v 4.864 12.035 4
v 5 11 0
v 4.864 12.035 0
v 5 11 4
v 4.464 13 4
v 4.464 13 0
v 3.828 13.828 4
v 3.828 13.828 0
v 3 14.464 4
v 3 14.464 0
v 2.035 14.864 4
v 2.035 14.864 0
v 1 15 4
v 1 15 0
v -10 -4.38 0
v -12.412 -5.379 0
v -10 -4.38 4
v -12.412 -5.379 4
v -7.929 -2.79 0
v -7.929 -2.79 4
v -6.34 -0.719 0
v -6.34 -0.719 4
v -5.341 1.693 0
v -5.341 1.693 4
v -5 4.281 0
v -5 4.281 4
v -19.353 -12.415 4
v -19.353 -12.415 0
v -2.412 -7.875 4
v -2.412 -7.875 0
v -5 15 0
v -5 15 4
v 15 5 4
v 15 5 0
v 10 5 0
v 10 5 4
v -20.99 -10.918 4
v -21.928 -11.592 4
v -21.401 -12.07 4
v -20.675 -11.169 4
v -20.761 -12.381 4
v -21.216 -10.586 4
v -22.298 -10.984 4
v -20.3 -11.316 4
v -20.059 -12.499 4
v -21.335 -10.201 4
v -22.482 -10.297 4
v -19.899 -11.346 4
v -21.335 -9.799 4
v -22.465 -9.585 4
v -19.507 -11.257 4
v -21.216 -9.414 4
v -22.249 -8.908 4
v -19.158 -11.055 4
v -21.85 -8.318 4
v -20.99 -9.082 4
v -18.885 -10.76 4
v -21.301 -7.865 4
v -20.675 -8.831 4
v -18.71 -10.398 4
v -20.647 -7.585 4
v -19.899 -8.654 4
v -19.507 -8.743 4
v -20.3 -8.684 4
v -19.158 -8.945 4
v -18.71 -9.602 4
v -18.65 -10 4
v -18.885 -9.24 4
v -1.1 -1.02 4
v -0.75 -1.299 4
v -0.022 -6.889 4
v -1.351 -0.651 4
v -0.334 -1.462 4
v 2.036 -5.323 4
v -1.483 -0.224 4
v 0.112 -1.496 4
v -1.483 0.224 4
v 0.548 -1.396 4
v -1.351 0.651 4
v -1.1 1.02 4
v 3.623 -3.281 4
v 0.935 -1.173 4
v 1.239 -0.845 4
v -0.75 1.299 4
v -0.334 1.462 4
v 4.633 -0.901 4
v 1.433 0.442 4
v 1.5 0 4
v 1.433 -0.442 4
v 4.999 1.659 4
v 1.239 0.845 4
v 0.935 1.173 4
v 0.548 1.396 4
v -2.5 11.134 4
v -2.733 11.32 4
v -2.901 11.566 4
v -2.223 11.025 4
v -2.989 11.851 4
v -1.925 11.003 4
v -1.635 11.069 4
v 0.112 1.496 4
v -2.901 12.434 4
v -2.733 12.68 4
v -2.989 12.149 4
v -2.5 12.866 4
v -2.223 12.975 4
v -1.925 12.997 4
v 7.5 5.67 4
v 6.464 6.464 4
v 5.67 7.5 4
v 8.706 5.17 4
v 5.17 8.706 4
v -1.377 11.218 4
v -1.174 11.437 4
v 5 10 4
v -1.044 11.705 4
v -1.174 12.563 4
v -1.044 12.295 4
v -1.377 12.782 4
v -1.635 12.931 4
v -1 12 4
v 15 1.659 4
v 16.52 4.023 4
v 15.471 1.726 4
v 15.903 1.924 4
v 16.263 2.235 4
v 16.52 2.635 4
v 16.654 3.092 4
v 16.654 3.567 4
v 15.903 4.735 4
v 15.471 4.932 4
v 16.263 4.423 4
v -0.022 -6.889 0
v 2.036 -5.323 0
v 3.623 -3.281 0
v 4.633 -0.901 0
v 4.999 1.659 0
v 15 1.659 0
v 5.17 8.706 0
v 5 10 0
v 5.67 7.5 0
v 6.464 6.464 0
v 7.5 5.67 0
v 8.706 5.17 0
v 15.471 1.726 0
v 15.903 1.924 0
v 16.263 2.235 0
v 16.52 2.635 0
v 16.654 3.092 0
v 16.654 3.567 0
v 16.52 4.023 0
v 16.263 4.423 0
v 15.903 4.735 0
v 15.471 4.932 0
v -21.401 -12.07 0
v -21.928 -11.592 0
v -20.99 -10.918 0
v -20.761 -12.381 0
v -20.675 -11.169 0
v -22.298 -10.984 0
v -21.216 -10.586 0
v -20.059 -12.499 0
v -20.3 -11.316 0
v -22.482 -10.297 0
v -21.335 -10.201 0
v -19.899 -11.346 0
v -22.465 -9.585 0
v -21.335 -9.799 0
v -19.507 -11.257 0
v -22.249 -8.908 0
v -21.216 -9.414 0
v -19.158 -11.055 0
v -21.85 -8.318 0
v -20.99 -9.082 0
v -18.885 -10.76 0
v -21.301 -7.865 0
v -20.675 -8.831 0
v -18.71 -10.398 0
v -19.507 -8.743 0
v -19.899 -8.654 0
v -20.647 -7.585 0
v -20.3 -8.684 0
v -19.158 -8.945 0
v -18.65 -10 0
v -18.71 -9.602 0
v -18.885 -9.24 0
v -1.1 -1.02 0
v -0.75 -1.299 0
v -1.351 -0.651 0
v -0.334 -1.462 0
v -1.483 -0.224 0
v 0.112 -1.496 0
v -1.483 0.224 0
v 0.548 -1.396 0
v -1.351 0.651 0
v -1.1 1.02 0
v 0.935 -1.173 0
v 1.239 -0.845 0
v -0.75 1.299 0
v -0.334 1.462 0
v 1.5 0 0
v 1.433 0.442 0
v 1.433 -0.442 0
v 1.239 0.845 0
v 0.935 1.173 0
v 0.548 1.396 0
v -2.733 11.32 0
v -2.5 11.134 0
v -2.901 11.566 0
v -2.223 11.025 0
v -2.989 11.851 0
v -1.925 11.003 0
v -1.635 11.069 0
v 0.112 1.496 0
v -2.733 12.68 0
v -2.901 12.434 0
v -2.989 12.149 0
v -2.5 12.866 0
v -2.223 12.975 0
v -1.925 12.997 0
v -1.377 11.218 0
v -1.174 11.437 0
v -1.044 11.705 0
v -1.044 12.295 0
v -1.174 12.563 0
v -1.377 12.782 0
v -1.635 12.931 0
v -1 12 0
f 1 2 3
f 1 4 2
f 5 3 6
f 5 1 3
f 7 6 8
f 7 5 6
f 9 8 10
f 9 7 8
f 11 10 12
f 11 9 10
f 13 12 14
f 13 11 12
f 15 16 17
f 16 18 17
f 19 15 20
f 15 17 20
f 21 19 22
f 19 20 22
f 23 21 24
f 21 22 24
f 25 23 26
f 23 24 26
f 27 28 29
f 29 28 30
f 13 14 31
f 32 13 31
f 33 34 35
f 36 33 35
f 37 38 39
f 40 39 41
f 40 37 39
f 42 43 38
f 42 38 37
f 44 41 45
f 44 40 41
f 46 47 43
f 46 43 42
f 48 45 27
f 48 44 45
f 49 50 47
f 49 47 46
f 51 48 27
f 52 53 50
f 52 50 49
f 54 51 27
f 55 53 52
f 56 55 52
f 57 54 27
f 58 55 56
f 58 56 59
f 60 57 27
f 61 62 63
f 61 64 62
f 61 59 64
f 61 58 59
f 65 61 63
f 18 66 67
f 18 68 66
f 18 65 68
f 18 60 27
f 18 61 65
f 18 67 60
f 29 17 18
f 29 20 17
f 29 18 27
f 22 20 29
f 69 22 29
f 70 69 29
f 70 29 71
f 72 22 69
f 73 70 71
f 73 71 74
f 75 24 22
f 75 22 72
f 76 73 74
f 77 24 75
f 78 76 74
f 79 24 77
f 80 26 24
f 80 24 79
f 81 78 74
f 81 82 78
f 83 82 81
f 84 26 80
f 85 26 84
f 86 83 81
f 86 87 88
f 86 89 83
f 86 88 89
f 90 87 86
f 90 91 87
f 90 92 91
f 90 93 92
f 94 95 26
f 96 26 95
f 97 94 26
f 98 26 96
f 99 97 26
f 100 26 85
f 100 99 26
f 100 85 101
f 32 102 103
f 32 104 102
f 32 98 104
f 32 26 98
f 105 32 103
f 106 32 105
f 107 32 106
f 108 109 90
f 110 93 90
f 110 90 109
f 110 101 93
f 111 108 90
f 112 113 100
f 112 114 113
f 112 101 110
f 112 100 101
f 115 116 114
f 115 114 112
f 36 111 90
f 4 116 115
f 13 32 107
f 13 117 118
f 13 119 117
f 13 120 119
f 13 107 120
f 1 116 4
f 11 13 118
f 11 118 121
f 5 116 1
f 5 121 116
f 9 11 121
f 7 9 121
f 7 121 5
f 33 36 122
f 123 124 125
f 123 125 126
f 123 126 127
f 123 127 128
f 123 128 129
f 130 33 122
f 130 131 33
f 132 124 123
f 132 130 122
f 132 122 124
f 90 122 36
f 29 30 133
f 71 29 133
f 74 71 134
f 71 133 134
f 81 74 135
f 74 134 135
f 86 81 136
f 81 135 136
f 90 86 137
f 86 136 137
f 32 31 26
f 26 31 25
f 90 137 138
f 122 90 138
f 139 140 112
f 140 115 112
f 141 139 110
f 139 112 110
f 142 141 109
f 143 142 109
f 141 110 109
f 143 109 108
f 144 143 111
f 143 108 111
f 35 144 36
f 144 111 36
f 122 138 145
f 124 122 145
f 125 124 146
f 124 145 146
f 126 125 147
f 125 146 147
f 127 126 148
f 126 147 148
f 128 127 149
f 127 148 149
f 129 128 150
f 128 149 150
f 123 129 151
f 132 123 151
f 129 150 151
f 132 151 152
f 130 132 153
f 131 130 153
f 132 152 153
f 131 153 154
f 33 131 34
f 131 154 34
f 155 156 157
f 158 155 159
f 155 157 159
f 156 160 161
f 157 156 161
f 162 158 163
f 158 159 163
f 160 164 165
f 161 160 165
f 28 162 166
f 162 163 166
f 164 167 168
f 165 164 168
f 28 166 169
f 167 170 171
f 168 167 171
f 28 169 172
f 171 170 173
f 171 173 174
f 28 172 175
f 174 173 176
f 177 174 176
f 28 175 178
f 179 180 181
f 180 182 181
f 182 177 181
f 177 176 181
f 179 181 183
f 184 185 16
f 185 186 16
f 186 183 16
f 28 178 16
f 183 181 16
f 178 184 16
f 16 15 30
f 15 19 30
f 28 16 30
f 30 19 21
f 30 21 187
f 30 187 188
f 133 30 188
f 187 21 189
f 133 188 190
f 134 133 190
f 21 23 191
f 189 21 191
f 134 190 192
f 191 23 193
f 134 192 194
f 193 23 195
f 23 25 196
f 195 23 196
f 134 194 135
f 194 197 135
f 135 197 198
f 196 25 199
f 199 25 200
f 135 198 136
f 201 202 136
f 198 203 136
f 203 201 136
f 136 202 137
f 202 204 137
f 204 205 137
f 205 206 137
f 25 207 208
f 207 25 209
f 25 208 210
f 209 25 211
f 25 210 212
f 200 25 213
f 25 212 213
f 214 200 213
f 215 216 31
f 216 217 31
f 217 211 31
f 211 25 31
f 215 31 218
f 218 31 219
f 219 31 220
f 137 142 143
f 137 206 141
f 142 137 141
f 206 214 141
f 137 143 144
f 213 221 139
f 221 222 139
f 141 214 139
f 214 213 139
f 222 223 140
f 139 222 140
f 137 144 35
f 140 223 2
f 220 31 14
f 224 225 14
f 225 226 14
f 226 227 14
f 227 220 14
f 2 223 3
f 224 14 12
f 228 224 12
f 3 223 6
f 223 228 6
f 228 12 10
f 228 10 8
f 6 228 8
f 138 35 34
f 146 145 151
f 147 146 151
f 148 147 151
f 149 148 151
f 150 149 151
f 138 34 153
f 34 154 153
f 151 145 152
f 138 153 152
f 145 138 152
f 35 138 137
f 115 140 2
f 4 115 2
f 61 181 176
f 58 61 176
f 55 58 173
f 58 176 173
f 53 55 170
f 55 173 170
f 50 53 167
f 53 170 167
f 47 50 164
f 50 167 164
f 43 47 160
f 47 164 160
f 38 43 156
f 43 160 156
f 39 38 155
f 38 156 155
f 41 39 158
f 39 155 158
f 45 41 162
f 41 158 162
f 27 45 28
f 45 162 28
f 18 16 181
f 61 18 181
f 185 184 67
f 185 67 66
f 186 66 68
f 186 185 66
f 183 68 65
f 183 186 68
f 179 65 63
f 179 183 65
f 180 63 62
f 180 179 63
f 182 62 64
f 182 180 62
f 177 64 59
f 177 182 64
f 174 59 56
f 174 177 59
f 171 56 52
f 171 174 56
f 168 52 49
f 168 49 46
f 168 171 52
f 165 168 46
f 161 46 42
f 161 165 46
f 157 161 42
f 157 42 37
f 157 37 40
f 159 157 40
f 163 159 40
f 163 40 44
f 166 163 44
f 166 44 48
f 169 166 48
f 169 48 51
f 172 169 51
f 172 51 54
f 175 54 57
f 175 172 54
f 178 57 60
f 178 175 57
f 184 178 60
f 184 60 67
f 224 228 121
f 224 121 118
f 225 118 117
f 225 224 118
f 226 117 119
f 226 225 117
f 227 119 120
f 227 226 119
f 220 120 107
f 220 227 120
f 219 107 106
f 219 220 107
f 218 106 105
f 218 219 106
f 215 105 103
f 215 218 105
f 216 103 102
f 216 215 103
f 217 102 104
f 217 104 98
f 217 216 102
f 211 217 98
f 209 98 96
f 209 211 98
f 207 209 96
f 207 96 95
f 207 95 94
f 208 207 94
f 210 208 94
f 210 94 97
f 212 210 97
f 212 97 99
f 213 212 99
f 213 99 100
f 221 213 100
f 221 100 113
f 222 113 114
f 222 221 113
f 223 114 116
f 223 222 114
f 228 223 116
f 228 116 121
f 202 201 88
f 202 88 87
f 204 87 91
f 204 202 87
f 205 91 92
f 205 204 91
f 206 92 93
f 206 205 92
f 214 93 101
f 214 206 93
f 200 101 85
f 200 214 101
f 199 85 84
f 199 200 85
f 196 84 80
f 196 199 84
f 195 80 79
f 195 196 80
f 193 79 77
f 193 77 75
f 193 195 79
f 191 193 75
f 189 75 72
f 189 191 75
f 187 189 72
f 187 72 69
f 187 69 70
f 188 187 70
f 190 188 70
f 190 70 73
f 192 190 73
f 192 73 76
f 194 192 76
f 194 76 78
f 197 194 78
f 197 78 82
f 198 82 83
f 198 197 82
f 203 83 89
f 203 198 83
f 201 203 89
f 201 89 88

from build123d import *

# Parameters (mm, degrees)
SKETCH1_R           = 1.5
SKETCH1_R_2         = 1
SKETCH1_R_3         = 1.35
BOSS_EXTRUDE1_DEPTH = 4
FILLET1_R           = 10
FILLET2_R           = 10
FILLET3_R           = 5
FILLET4_R           = 4


with BuildPart() as part:
    # Sketch1 → Boss-Extrude1 (new body)
    with BuildSketch(Plane.XY):
        with BuildLine():
            Line((15, 5), (5, 5))
            Line((5, 5), (5, 15))
            Line((5, 15), (-5, 15))
            Line((-5, 15), (-5, -3.392571663))
            Line((-5, -3.392571663), (-20.647047613, -7.585185434))
            ThreePointArc((-20.647047613, -7.585185434), (-22.414814566, -10.647047613), (-19.352952387, -12.414814566))
            Line((-19.352952387, -12.414814566), (5, -5.88946064))
            Line((5, -5.88946064), (5, 1.658780206))
            Line((5, 1.658780206), (15, 1.658780206))
            ThreePointArc((15, 1.658780206), (16.670609897, 3.329390103), (15, 5))
        make_face()
        Circle(SKETCH1_R, mode=Mode.SUBTRACT)
        with Locations((-2, 12)):
            Circle(SKETCH1_R_2, mode=Mode.SUBTRACT)
        with Locations((-20, -10)):
            Circle(SKETCH1_R_3, mode=Mode.SUBTRACT)
    extrude(amount=BOSS_EXTRUDE1_DEPTH)

    # Fillet1
    # the kernel refuses this fillet: 10 mm, written as the material it takes off along each edge
    with BuildSketch(Plane(origin=(5, -5.88946064, -19.183174699), x_dir=(-0.965925826289069, -0.2588190451025183, 0), z_dir=(0, 0, 1))) as fillet1_piece_1_section:
        with BuildLine():
            CenterArc((FILLET1_R * 0.767326987979, -FILLET1_R), FILLET1_R, 90, 75)
            Line((-FILLET1_R * 0.19859883831, -FILLET1_R * 0.741180954897), (0, 0))
            Line((0, 0), (FILLET1_R * 0.767326987979, 0))
        make_face()
    fillet1_piece_1 = extrude(amount=42.366349399, mode=Mode.PRIVATE)
    fillet1_piece_1 = split(fillet1_piece_1, bisect_by=Plane(origin=(3.36090957, 1.658780206, 2), z_dir=(0, -1, 0)), keep=Keep.TOP, mode=Mode.PRIVATE)
    add(fillet1_piece_1, mode=Mode.SUBTRACT)

    # Fillet2
    fillet2_edges = [part.edges().sort_by_distance(p)[0] for p in [
        (-5, -3.392571663, 2),
    ]]
    fillet(fillet2_edges, radius=FILLET2_R)

    # Fillet3
    fillet3_edges = [part.edges().sort_by_distance(p)[0] for p in [
        (5, 5, 2),
    ]]
    fillet(fillet3_edges, radius=FILLET3_R)

    # Fillet4
    fillet4_edges = [part.edges().sort_by_distance(p)[0] for p in [
        (5, 15, 2),
    ]]
    fillet(fillet4_edges, radius=FILLET4_R)


solid = part.part
